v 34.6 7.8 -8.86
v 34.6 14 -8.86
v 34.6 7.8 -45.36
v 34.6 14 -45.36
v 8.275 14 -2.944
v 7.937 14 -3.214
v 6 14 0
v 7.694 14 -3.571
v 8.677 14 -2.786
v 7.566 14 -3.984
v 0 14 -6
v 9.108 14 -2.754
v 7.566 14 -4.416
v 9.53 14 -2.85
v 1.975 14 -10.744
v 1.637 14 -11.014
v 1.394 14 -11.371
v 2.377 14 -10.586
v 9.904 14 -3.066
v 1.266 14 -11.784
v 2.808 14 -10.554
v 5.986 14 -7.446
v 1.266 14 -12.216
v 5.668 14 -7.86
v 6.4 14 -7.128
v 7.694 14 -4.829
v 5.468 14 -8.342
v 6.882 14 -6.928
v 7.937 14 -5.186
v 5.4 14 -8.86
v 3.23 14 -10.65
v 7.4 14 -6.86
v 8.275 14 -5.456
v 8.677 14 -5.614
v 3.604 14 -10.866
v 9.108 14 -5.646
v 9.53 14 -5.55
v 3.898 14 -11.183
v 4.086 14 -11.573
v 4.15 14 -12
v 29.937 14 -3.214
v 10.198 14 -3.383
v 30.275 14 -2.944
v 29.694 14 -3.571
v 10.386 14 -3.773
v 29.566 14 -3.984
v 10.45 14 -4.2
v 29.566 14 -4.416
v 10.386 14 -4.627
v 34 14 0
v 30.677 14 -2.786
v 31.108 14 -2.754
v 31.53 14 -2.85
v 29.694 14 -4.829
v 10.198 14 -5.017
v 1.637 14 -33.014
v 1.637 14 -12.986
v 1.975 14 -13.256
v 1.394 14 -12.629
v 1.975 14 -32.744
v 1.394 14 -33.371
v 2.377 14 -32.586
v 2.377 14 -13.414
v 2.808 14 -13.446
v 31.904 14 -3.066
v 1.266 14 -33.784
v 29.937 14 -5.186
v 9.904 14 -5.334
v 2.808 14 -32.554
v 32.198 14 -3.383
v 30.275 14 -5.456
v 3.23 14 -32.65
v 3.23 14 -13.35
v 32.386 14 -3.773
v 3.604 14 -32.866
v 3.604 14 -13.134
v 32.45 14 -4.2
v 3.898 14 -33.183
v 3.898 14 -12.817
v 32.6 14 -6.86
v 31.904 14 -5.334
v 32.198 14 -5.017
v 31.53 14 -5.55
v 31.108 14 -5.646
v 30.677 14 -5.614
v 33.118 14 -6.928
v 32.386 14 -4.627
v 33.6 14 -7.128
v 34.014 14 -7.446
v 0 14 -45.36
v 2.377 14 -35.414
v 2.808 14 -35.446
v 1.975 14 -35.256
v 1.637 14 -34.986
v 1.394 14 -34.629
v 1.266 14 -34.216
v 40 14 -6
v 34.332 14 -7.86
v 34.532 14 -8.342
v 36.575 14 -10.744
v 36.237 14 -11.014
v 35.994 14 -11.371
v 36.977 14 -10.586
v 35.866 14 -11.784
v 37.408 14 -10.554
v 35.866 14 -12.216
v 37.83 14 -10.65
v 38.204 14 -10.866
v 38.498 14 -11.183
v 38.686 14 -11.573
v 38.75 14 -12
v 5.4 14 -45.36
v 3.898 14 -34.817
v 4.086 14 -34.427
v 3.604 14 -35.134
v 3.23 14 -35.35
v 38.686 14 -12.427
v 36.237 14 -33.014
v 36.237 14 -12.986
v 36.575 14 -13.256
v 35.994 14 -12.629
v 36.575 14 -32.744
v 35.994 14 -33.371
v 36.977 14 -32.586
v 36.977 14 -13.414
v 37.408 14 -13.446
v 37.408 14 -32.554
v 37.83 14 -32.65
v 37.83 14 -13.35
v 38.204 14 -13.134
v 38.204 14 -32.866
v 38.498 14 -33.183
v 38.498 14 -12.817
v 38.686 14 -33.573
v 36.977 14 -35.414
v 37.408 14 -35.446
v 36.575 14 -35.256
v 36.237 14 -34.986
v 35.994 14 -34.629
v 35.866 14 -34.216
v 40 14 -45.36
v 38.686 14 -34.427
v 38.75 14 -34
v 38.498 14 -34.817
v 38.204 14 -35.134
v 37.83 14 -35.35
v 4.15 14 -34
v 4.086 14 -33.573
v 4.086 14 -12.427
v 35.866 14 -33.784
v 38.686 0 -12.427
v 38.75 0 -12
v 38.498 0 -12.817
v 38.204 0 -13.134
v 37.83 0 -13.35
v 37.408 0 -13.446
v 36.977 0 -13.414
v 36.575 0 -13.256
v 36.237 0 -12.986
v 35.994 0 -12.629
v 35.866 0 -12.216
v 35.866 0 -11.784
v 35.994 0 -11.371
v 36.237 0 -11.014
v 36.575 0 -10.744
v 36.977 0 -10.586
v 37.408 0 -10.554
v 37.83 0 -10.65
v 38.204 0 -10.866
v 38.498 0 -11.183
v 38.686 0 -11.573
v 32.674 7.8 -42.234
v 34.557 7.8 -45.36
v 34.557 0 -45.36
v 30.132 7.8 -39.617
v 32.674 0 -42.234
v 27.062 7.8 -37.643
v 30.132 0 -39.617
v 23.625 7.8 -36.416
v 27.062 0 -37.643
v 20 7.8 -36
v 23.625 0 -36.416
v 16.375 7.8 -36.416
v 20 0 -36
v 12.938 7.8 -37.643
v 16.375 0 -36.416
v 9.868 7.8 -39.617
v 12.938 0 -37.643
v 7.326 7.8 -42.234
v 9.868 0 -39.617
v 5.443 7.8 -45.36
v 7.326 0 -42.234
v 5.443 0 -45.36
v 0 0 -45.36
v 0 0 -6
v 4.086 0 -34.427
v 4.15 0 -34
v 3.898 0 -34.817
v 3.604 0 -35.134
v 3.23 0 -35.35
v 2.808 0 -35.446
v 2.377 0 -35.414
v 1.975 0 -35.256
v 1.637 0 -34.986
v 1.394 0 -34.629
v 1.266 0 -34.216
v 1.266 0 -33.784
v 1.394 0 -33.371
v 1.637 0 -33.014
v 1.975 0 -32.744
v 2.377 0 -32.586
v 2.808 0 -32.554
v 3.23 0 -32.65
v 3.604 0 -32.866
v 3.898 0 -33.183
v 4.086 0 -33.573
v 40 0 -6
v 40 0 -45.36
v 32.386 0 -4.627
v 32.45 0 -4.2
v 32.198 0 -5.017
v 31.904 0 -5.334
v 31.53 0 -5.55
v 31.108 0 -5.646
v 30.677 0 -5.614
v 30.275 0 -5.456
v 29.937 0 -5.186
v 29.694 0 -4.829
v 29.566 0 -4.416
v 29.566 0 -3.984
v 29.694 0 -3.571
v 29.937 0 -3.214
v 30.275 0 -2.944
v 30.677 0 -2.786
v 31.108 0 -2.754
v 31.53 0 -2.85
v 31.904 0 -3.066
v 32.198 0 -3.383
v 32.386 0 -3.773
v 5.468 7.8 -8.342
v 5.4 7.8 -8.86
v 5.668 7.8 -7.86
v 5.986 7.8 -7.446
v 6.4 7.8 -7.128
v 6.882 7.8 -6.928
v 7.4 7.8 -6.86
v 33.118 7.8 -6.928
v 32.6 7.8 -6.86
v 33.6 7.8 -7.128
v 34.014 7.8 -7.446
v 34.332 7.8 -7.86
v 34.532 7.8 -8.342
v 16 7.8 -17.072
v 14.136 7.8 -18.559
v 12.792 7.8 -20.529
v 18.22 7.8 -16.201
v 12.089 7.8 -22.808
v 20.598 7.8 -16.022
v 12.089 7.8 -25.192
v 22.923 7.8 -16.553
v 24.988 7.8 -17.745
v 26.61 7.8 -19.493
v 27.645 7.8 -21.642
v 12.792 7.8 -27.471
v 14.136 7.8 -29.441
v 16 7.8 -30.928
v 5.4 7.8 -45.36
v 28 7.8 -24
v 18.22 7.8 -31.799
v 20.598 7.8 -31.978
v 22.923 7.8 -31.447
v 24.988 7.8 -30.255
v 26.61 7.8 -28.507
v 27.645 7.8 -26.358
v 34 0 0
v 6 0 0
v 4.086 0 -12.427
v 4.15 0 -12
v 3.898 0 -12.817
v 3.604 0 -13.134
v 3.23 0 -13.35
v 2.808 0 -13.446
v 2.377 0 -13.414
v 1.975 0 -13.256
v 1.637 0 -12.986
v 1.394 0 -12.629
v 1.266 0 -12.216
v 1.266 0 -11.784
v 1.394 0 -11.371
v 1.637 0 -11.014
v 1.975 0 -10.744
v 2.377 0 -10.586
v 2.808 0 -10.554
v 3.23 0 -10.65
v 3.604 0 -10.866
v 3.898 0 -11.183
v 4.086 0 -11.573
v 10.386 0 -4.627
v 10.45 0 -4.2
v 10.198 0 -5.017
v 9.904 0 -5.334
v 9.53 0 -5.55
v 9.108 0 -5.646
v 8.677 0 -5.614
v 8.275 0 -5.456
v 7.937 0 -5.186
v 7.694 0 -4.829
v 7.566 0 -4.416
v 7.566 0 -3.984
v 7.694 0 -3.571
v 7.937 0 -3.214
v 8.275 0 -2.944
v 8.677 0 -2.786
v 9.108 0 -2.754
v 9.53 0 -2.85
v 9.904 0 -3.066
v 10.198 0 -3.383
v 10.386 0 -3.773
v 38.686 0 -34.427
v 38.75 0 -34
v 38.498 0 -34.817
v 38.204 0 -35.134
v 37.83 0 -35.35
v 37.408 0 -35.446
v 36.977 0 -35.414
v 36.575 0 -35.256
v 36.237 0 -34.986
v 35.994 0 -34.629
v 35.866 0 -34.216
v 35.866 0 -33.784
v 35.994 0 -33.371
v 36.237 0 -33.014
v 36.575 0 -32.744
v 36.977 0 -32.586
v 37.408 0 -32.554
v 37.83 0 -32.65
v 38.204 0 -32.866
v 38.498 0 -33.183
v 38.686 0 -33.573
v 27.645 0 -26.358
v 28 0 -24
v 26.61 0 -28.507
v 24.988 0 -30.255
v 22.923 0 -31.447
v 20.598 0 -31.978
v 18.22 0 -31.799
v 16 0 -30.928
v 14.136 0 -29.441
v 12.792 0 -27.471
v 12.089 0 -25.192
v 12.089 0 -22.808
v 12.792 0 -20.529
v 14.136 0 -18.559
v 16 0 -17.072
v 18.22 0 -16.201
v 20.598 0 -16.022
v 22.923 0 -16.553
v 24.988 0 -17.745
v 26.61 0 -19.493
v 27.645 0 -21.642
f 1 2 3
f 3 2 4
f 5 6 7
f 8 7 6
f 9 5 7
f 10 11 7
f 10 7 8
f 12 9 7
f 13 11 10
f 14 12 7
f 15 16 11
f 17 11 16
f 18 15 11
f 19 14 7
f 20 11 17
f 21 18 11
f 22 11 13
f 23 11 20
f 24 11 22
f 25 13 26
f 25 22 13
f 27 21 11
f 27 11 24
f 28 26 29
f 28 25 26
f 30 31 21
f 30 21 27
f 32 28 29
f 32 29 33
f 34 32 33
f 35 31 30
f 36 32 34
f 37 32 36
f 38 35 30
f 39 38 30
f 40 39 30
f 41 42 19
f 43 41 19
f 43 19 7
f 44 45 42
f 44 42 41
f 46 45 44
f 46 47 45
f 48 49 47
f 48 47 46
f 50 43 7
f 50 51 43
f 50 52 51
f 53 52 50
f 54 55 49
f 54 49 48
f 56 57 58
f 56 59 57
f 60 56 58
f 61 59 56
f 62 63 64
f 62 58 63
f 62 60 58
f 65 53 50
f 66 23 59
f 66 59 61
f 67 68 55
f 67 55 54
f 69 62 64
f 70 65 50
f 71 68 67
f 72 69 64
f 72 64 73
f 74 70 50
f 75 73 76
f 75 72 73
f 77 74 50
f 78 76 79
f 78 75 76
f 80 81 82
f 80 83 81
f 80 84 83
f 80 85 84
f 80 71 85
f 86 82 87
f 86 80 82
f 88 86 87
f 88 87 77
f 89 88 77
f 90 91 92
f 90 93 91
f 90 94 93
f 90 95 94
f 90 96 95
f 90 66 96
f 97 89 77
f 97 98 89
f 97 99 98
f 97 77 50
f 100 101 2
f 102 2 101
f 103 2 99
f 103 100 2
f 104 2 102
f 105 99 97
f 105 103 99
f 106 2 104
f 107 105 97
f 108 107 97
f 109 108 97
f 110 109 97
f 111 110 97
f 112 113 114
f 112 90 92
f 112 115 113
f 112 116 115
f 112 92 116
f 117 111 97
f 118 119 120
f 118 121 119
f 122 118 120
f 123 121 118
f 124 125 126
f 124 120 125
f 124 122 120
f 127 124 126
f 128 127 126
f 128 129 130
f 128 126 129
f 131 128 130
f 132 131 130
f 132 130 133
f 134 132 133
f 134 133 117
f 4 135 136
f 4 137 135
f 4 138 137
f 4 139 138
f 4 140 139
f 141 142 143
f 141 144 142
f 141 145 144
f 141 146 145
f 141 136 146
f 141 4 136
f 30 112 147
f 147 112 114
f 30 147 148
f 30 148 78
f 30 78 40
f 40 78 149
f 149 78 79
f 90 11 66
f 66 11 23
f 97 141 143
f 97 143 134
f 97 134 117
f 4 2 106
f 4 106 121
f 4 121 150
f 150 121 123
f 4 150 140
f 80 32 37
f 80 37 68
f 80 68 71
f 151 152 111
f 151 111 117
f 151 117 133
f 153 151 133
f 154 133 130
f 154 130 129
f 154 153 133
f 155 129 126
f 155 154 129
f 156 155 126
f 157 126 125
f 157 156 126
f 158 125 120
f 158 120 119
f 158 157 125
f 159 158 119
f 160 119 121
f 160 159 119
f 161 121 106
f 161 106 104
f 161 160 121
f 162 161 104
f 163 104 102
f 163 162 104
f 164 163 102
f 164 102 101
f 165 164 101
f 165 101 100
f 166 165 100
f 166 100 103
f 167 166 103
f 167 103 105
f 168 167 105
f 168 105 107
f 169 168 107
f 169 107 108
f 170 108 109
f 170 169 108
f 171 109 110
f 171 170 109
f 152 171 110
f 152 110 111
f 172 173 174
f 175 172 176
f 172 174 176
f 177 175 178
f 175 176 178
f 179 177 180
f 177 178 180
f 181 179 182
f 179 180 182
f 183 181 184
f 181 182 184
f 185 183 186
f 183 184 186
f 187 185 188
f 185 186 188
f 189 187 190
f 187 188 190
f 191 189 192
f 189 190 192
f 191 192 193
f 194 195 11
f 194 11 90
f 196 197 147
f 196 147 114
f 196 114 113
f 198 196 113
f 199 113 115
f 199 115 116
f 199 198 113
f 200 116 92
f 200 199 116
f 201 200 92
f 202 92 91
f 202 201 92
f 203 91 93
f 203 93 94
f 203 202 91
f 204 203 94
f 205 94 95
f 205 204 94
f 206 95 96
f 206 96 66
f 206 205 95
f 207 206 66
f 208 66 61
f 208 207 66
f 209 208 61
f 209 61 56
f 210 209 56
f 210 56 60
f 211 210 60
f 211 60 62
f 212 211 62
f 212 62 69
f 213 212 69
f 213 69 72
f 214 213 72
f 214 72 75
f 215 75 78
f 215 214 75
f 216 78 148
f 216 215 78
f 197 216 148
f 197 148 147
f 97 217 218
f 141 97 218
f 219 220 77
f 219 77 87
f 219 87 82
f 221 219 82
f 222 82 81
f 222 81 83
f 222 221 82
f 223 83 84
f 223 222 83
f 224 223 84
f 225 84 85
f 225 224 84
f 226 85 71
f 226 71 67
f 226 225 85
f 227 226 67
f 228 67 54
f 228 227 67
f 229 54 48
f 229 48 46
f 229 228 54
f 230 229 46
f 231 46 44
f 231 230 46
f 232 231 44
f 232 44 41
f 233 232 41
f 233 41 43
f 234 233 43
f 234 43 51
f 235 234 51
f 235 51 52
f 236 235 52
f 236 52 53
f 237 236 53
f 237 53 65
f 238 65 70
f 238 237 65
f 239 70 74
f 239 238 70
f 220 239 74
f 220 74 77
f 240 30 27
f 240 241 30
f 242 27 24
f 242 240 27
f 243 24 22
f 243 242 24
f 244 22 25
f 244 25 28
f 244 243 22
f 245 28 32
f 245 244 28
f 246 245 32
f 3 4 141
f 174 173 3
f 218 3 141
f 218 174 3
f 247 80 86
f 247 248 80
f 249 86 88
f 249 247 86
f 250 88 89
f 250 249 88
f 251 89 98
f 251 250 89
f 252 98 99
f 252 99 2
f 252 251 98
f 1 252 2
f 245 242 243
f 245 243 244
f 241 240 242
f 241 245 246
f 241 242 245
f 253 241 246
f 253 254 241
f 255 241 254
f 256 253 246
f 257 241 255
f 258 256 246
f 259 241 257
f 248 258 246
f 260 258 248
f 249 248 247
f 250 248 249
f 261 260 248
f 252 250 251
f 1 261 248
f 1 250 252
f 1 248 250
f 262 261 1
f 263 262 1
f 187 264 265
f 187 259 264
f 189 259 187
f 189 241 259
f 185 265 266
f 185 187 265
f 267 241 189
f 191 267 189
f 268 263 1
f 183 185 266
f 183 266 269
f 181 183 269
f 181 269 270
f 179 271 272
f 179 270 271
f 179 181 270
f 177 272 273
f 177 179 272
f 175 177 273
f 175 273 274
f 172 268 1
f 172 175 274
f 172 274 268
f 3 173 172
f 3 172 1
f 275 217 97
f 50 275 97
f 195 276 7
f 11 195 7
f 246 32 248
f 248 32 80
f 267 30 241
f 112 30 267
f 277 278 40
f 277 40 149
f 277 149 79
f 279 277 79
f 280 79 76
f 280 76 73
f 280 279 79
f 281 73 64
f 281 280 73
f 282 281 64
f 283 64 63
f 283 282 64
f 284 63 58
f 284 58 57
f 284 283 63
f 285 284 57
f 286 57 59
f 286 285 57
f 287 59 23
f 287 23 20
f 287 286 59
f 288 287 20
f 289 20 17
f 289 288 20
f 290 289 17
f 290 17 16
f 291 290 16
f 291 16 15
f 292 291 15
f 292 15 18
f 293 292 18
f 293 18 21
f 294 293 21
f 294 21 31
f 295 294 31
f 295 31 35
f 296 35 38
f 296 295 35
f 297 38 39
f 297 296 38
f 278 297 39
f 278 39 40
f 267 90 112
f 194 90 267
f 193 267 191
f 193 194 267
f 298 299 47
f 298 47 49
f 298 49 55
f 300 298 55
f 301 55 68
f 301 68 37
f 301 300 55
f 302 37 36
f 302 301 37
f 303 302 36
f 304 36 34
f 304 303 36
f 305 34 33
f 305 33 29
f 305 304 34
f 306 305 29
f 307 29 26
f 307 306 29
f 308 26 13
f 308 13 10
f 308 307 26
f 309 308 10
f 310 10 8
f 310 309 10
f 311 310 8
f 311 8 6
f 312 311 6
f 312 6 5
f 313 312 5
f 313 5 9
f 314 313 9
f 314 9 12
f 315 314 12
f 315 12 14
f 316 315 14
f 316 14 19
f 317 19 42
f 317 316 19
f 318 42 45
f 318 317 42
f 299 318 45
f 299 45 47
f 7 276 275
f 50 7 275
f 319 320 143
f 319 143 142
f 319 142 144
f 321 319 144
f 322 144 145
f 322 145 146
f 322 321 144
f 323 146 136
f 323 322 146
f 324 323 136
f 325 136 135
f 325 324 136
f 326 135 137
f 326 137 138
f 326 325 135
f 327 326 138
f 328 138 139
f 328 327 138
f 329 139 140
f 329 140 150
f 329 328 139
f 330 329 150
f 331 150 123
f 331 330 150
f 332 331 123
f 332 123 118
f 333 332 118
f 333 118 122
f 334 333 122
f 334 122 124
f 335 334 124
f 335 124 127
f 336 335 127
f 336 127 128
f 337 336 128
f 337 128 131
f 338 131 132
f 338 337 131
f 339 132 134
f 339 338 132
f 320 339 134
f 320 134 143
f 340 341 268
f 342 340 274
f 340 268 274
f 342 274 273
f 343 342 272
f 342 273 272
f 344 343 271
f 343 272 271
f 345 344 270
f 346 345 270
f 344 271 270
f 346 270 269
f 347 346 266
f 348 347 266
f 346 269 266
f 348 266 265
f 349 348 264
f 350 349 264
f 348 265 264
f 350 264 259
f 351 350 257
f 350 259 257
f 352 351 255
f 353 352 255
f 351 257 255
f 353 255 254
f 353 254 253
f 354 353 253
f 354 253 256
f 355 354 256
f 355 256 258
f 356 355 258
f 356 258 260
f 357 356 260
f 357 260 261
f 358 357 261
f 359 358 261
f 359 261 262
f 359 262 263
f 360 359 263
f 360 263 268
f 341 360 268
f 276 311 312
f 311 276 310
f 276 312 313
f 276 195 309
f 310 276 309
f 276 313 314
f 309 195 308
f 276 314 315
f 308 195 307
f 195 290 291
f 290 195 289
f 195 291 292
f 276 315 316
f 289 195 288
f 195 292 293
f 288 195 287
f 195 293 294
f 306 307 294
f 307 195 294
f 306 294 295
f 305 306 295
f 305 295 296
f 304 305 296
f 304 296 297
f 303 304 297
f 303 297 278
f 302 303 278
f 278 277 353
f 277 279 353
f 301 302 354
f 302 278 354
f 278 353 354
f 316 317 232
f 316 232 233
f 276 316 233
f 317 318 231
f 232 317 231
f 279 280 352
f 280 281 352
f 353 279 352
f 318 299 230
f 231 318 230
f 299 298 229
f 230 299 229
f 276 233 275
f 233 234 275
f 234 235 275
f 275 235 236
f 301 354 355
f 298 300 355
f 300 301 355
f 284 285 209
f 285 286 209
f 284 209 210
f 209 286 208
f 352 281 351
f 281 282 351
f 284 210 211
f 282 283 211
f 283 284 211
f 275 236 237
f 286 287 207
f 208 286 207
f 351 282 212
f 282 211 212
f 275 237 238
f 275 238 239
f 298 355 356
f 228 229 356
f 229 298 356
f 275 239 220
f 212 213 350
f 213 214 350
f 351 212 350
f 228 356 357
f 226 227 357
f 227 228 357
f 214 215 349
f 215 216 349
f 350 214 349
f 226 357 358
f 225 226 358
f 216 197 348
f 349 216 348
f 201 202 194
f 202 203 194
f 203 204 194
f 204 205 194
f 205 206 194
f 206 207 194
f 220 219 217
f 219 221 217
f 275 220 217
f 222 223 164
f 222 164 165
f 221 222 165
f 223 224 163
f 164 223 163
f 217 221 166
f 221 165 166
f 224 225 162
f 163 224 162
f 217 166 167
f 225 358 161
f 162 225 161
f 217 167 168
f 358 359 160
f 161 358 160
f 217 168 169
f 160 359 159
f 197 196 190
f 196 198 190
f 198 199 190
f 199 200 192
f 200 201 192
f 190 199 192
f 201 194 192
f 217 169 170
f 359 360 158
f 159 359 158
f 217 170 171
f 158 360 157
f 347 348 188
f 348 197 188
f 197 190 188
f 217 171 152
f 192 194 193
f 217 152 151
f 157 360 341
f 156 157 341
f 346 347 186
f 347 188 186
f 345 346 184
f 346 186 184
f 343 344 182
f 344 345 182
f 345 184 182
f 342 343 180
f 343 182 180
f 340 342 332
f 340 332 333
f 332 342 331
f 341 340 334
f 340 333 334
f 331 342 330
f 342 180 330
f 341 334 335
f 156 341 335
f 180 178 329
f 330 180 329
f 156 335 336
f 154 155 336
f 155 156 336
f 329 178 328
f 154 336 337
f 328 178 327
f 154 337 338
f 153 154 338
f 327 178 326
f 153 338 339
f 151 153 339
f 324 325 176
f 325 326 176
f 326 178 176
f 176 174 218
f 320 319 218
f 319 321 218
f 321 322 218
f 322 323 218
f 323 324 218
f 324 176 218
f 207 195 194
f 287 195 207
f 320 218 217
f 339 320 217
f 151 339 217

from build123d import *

# Parameters (mm, degrees)
SKETCH1_W                      = 40
SKETCH1_H                      = 45.36
BOSS_EXTRUDE1_DEPTH            = 14
SKETCH2_W                      = 29.2
SKETCH2_H                      = 38.5
CUT_EXTRUDE1_DEPTH             = 6.2
M2_5_CLEARANCE_HOLE1_OUTLINE_R = 1.45
M2_5_CLEARANCE_HOLE1_DEPTH     = 14
F_16_0MM_DOWEL_HOLE1_D         = 16
SKETCH11_R                     = 16
CUT_EXTRUDE2_DEPTH             = 63.076804041
CHAMFER1_SIZE                  = 6
FILLET1_R                      = 2


# Read off the part's stored shape, not the designer's step: M2.5 Clearance Hole1
with BuildPart() as part:
    # Sketch1 → Boss-Extrude1 (new body)
    with BuildSketch(Plane(origin=(0, 0, 0), x_dir=(1, 0, 0), z_dir=(0, 1, 0))):
        with Locations((20, 22.68)):
            Rectangle(SKETCH1_W, SKETCH1_H)
    extrude(amount=BOSS_EXTRUDE1_DEPTH)

    # Sketch2 → Cut-Extrude1 (cut)
    with BuildSketch(Plane(origin=(0, 14, 0), x_dir=(1, 0, 0), z_dir=(0, 1, 0))):
        with Locations((20, 26.11)):
            Rectangle(SKETCH2_W, SKETCH2_H)
    extrude(amount=-CUT_EXTRUDE1_DEPTH, mode=Mode.SUBTRACT)

    # M2.5 Clearance Hole1 outline → M2.5 Clearance Hole1 (cut)
    with BuildSketch(Plane(origin=(0, 0, 0), x_dir=(1, 0, 0), z_dir=(0, 1, 0))):
        with Locations((9, 4.2)):
            Circle(M2_5_CLEARANCE_HOLE1_OUTLINE_R)
        with Locations((31, 4.2)):
            Circle(M2_5_CLEARANCE_HOLE1_OUTLINE_R)
        with Locations((2.7, 34)):
            Circle(M2_5_CLEARANCE_HOLE1_OUTLINE_R)
        with Locations((2.7, 12)):
            Circle(M2_5_CLEARANCE_HOLE1_OUTLINE_R)
        with Locations((37.3, 12)):
            Circle(M2_5_CLEARANCE_HOLE1_OUTLINE_R)
        with Locations((37.3, 34)):
            Circle(M2_5_CLEARANCE_HOLE1_OUTLINE_R)
    extrude(amount=M2_5_CLEARANCE_HOLE1_DEPTH, mode=Mode.SUBTRACT)

    # Ø16.0mm Dowel Hole1 (through all)
    with Locations(Plane(origin=(0, 0, 0), x_dir=(-1, 0, 0), z_dir=(0, -1, 0))):
        with Locations((-20, 24)):
            Hole(F_16_0MM_DOWEL_HOLE1_D / 2)

    # Sketch11 → Cut-Extrude2 (cut, through all)
    with BuildSketch(Plane.XZ):
        with Locations((20, -52)):
            Circle(SKETCH11_R)
    extrude(amount=-CUT_EXTRUDE2_DEPTH, mode=Mode.SUBTRACT)

    # Chamfer1
    chamfer1_edges = [part.edges().sort_by_distance(p)[0] for p in [
        (0, 7, 0),
        (40, 7, 0),
    ]]
    chamfer(chamfer1_edges, length=CHAMFER1_SIZE)

    # Fillet1
    fillet1_edges = [part.edges().sort_by_distance(p)[0] for p in [
        (5.4, 10.9, -6.86),
        (34.6, 10.9, -6.86),
    ]]
    fillet(fillet1_edges, radius=FILLET1_R)


solid = part.part
